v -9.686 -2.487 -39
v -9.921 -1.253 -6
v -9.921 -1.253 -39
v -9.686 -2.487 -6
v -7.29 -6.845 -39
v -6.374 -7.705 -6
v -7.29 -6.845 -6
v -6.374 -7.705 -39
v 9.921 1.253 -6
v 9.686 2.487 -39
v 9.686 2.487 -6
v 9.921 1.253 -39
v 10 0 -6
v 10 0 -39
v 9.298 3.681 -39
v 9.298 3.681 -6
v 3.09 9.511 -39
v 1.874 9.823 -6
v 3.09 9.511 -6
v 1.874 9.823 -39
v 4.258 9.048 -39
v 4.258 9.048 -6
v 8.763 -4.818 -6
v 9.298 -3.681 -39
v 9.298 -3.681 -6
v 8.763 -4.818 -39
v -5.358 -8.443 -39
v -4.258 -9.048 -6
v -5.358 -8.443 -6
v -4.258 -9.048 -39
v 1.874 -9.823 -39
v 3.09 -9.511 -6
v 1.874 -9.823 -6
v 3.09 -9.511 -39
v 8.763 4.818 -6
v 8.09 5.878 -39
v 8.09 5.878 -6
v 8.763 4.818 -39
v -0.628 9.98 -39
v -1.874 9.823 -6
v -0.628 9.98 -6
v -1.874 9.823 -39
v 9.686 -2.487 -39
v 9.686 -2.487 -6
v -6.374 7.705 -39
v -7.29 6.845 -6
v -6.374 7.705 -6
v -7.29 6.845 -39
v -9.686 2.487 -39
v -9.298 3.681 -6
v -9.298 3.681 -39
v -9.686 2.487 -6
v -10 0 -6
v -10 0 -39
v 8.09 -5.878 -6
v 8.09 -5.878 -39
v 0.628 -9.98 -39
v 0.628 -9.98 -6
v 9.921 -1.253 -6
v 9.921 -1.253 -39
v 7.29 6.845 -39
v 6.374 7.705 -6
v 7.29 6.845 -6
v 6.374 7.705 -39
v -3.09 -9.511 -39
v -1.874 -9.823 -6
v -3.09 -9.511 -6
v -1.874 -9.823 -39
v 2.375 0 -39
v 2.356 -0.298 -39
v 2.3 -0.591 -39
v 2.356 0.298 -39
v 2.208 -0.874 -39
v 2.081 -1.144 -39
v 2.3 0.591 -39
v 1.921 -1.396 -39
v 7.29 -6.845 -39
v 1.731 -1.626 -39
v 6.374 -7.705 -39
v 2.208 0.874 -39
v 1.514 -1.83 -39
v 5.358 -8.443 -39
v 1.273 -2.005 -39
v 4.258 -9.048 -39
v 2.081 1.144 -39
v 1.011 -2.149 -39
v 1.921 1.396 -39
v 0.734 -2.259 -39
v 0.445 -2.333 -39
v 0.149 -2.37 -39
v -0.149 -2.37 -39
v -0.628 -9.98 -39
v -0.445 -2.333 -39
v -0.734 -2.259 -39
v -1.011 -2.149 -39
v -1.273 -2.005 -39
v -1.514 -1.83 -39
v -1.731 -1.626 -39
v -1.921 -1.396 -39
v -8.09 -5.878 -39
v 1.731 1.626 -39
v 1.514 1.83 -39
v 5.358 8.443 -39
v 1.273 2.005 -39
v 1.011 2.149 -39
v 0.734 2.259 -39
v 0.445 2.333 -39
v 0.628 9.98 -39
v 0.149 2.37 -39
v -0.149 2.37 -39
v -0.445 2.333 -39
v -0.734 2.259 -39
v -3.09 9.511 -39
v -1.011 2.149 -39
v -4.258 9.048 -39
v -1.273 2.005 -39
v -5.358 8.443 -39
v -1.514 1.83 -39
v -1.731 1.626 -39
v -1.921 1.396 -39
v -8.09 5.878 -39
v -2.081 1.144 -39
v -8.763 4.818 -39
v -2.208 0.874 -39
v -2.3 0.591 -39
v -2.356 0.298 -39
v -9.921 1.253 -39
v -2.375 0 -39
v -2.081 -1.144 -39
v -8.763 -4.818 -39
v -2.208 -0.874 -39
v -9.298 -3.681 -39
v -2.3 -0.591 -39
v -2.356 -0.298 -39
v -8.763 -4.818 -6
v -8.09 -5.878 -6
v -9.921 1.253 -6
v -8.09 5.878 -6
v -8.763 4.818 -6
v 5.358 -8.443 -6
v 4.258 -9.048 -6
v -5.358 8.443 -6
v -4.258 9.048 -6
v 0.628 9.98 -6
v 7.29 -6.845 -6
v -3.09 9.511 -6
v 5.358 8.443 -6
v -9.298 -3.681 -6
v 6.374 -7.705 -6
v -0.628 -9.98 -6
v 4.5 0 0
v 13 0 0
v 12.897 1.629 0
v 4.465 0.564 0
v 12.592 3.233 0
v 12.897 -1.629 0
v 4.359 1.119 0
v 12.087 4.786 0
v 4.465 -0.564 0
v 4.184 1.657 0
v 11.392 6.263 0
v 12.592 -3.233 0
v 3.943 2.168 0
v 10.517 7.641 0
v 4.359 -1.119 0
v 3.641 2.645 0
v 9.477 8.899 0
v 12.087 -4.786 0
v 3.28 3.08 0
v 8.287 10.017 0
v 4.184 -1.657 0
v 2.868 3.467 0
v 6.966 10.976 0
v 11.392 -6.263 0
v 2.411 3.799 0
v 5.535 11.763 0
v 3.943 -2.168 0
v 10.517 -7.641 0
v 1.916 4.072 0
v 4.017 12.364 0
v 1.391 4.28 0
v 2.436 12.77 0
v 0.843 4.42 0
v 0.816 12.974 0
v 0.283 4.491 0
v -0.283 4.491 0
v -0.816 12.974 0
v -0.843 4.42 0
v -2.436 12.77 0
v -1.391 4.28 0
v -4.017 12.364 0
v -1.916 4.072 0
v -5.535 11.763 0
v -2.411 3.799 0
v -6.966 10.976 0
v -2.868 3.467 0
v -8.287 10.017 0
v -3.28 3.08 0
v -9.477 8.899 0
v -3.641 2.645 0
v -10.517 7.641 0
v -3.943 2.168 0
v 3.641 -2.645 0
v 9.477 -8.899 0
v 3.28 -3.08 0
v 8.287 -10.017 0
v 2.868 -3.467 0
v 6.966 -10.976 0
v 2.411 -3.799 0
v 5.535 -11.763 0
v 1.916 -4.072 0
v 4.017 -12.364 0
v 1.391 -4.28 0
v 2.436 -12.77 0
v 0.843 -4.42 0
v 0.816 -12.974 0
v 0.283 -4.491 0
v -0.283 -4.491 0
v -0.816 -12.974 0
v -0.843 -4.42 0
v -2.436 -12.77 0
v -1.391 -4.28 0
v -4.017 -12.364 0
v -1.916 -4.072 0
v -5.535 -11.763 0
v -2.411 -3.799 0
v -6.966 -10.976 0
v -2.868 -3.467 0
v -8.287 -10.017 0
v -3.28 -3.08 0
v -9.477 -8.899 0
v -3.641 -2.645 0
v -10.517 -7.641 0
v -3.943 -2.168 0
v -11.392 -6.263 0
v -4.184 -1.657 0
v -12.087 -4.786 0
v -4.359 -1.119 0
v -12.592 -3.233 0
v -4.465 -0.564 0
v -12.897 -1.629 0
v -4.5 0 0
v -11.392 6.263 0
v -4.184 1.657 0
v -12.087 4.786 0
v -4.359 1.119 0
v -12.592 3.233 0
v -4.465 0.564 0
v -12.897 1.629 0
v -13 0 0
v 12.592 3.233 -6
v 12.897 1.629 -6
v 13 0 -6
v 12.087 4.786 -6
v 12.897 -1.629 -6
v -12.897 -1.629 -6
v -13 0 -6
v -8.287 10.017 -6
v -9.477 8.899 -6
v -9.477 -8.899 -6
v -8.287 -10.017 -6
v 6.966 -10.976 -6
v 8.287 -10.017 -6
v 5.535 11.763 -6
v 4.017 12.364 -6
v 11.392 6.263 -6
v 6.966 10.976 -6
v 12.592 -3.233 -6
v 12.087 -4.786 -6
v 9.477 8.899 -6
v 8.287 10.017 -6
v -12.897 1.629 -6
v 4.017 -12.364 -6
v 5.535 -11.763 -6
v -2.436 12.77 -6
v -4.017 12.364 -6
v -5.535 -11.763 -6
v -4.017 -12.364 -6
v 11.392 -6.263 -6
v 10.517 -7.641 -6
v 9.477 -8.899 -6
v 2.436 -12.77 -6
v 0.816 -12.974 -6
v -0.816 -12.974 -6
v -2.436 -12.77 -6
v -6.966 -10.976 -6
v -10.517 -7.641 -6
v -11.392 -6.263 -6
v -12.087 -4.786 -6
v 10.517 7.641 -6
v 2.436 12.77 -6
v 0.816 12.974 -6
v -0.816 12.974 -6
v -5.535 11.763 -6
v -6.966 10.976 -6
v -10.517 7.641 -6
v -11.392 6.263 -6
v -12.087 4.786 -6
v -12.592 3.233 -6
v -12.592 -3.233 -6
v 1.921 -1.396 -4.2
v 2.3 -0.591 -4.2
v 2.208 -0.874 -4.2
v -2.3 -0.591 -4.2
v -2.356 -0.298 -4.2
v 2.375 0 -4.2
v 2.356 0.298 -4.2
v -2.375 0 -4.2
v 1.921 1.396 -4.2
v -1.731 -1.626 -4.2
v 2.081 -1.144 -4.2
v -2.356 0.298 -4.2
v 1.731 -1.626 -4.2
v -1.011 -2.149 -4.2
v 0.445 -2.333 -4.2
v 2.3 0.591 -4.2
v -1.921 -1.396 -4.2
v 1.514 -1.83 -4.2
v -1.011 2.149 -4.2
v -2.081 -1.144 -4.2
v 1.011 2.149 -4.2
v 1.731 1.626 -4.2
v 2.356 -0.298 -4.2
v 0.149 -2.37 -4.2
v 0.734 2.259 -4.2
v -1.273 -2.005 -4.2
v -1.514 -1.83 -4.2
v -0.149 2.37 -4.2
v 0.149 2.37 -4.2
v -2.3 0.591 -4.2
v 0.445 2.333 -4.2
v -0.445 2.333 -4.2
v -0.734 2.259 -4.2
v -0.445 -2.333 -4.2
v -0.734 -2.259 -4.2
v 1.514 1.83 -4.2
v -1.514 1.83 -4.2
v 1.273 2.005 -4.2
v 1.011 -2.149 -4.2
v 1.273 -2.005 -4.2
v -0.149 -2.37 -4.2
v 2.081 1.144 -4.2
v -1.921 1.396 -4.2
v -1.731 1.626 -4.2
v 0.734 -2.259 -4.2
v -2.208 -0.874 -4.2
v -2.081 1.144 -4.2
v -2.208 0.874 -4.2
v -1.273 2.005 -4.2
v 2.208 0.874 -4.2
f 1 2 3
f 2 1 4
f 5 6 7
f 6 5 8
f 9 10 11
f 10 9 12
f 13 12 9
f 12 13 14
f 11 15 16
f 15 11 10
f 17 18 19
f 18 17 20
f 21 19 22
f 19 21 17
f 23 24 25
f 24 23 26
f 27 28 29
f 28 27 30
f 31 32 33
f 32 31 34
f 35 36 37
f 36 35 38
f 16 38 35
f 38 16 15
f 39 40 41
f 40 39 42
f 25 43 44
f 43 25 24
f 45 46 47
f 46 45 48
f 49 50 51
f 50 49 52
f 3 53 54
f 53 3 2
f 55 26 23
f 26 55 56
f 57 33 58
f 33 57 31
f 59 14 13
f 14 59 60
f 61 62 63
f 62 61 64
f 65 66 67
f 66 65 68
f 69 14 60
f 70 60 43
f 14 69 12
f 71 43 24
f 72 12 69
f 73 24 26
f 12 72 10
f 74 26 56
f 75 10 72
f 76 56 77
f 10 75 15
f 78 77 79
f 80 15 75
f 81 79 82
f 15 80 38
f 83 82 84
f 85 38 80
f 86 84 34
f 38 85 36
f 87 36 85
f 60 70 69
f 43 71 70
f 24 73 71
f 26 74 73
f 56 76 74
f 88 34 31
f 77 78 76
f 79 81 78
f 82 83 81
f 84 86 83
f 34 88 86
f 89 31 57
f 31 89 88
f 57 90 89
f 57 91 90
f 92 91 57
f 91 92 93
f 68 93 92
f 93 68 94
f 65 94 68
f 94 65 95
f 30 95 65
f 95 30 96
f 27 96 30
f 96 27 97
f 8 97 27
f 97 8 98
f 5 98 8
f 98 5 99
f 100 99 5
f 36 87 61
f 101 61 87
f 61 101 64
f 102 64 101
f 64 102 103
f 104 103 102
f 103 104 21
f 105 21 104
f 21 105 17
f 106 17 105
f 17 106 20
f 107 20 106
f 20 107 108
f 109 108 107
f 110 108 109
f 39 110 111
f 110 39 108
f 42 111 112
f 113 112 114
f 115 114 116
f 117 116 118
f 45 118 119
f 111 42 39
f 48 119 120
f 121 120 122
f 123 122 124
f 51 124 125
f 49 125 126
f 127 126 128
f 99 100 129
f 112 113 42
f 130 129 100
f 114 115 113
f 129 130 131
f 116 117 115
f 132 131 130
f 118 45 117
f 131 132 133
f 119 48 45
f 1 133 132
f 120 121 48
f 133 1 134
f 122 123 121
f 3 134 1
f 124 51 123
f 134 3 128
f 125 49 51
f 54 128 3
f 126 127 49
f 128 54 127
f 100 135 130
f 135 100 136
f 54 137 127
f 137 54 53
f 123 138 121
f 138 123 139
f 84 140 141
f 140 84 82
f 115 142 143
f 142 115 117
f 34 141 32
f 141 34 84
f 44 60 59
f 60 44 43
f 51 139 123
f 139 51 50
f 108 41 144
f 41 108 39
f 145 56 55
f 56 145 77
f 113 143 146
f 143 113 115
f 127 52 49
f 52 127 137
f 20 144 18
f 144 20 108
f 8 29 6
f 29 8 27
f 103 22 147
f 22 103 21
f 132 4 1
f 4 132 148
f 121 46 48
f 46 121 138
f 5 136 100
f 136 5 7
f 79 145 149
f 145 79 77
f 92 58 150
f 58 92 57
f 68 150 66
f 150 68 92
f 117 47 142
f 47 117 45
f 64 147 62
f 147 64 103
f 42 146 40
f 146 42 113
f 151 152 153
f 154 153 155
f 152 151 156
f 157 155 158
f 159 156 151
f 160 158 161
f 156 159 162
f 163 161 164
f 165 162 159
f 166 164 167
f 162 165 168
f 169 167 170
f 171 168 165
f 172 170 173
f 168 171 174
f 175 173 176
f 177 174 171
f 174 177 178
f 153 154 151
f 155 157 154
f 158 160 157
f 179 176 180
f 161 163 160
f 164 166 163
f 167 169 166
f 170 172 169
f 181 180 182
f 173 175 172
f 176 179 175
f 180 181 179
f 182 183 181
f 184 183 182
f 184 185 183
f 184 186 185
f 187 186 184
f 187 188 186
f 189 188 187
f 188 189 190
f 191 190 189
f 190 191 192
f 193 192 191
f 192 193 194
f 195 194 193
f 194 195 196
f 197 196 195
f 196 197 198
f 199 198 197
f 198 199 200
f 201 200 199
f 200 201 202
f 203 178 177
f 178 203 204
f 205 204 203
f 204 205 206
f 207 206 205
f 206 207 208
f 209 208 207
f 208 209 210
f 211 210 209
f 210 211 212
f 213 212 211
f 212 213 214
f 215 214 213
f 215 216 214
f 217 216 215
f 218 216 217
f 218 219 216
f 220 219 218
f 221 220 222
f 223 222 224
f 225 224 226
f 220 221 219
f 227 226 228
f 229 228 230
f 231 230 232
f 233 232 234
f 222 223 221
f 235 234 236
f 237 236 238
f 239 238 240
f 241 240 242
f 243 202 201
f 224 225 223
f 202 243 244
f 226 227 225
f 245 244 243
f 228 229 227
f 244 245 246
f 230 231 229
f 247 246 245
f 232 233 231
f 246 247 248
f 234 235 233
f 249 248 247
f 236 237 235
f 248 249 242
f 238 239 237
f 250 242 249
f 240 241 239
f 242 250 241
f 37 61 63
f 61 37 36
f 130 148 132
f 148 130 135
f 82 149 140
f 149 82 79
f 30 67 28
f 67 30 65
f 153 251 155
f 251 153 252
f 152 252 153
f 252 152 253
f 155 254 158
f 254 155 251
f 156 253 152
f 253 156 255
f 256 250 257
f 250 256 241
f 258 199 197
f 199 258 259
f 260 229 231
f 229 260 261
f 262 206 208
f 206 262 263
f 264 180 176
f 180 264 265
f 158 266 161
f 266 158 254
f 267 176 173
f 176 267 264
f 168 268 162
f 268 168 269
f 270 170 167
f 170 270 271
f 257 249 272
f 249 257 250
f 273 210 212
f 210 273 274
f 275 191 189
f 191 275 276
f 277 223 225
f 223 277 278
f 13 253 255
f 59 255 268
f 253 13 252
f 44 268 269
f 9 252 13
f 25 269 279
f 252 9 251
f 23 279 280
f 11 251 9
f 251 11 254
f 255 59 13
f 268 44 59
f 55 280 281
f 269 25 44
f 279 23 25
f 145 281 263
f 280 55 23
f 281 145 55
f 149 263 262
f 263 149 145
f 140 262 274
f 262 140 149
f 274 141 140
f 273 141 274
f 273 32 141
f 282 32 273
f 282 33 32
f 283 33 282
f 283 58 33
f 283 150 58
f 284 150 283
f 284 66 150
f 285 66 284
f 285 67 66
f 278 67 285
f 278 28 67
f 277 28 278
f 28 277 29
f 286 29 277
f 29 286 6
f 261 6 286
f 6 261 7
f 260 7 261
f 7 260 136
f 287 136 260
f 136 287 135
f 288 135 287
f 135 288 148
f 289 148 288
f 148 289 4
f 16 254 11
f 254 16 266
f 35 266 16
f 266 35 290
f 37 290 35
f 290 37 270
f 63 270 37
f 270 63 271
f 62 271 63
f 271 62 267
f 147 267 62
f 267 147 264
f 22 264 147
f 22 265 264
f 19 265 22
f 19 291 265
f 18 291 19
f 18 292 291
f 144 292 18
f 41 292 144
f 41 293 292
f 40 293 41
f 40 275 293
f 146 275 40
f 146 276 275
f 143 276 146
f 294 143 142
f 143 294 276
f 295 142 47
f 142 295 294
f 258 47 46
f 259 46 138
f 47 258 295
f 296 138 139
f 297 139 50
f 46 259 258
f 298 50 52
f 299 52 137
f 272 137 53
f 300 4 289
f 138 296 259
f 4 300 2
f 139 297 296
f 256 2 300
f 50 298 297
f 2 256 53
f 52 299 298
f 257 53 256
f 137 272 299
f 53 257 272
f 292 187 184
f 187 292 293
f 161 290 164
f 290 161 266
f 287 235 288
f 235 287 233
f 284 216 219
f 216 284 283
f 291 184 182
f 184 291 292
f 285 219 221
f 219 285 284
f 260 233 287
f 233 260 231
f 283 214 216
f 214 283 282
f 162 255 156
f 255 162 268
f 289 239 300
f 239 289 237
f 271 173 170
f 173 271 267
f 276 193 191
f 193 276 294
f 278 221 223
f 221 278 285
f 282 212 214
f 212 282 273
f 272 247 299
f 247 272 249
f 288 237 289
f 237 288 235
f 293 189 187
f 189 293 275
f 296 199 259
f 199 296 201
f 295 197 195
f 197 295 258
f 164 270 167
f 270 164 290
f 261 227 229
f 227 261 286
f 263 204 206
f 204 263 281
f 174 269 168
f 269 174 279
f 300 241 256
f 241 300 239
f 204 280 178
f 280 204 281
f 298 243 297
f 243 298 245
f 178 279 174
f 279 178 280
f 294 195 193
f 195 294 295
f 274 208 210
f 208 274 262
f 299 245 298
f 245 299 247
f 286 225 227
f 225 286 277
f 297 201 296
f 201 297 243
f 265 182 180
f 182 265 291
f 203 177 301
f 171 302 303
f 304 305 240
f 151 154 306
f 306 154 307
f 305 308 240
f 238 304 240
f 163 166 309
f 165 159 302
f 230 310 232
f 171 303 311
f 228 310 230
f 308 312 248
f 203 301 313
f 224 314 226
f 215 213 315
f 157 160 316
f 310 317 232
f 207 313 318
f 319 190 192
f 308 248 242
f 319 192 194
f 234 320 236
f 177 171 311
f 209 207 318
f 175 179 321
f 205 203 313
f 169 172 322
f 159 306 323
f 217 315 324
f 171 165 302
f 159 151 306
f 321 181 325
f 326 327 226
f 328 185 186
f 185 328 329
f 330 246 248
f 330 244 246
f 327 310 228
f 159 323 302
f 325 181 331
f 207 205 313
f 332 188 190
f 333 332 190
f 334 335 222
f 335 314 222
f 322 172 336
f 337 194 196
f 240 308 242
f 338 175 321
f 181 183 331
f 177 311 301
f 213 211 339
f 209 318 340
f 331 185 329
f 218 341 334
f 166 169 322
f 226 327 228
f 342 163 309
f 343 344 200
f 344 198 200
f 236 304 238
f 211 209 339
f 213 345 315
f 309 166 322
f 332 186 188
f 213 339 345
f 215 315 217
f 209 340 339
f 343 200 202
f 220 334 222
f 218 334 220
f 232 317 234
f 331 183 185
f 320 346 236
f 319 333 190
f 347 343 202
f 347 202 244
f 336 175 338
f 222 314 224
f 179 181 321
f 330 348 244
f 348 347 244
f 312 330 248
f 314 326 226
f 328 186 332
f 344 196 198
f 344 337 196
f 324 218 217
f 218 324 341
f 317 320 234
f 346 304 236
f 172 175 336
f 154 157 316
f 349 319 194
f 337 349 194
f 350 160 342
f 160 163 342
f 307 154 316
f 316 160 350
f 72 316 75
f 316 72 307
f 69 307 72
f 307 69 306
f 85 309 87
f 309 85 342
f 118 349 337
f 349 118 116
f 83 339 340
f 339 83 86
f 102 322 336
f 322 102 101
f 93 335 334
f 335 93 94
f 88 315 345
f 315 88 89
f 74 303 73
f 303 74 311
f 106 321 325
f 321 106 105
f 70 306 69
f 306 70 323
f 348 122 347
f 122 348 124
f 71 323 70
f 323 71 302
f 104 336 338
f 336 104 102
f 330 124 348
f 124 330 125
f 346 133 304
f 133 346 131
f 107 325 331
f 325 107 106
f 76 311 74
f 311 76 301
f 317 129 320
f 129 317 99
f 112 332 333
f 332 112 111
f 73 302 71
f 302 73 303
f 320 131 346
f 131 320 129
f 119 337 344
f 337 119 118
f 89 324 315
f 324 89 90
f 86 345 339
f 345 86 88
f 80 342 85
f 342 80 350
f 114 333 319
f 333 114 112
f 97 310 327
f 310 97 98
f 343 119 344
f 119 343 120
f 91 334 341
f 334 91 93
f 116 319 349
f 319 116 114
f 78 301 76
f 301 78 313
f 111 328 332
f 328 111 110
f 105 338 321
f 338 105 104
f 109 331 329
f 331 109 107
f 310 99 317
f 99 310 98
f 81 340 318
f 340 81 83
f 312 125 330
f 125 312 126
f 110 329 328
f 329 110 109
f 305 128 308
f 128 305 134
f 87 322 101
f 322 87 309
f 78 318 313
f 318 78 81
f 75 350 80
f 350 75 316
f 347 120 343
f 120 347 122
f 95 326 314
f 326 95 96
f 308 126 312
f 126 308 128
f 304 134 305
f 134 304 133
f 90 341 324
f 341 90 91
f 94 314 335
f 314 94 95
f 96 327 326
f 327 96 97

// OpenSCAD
$fn = 50;


difference() {
	union() {
		translate(v = [0, 0, -39.0000000000]) {
			cylinder(h = 39, r = 10.0000000000);
		}
		translate(v = [0, 0, -6.0000000000]) {
			cylinder(h = 6, r = 13.0000000000);
		}
	}
	union() {
		translate(v = [0, 0, 0]) {
			rotate(a = [0, 0, 0]) {
				difference() {
					union() {
						#translate(v = [0, 0, -39.0000000000]) {
							cylinder(h = 39, r = 2.2500000000);
						}
						#translate(v = [0, 0, -4.2000000000]) {
							cylinder(h = 4.2000000000, r = 10.0000000000, r1 = 2.3750000000, r2 = 4.5000000000);
						}
						#translate(v = [0, 0, -39.0000000000]) {
							cylinder(h = 39, r = 2.3750000000);
						}
						#translate(v = [0, 0, -39.0000000000]) {
							cylinder(h = 39, r = 2.2500000000);
						}
					}
					union();
				}
			}
		}
	}
}
